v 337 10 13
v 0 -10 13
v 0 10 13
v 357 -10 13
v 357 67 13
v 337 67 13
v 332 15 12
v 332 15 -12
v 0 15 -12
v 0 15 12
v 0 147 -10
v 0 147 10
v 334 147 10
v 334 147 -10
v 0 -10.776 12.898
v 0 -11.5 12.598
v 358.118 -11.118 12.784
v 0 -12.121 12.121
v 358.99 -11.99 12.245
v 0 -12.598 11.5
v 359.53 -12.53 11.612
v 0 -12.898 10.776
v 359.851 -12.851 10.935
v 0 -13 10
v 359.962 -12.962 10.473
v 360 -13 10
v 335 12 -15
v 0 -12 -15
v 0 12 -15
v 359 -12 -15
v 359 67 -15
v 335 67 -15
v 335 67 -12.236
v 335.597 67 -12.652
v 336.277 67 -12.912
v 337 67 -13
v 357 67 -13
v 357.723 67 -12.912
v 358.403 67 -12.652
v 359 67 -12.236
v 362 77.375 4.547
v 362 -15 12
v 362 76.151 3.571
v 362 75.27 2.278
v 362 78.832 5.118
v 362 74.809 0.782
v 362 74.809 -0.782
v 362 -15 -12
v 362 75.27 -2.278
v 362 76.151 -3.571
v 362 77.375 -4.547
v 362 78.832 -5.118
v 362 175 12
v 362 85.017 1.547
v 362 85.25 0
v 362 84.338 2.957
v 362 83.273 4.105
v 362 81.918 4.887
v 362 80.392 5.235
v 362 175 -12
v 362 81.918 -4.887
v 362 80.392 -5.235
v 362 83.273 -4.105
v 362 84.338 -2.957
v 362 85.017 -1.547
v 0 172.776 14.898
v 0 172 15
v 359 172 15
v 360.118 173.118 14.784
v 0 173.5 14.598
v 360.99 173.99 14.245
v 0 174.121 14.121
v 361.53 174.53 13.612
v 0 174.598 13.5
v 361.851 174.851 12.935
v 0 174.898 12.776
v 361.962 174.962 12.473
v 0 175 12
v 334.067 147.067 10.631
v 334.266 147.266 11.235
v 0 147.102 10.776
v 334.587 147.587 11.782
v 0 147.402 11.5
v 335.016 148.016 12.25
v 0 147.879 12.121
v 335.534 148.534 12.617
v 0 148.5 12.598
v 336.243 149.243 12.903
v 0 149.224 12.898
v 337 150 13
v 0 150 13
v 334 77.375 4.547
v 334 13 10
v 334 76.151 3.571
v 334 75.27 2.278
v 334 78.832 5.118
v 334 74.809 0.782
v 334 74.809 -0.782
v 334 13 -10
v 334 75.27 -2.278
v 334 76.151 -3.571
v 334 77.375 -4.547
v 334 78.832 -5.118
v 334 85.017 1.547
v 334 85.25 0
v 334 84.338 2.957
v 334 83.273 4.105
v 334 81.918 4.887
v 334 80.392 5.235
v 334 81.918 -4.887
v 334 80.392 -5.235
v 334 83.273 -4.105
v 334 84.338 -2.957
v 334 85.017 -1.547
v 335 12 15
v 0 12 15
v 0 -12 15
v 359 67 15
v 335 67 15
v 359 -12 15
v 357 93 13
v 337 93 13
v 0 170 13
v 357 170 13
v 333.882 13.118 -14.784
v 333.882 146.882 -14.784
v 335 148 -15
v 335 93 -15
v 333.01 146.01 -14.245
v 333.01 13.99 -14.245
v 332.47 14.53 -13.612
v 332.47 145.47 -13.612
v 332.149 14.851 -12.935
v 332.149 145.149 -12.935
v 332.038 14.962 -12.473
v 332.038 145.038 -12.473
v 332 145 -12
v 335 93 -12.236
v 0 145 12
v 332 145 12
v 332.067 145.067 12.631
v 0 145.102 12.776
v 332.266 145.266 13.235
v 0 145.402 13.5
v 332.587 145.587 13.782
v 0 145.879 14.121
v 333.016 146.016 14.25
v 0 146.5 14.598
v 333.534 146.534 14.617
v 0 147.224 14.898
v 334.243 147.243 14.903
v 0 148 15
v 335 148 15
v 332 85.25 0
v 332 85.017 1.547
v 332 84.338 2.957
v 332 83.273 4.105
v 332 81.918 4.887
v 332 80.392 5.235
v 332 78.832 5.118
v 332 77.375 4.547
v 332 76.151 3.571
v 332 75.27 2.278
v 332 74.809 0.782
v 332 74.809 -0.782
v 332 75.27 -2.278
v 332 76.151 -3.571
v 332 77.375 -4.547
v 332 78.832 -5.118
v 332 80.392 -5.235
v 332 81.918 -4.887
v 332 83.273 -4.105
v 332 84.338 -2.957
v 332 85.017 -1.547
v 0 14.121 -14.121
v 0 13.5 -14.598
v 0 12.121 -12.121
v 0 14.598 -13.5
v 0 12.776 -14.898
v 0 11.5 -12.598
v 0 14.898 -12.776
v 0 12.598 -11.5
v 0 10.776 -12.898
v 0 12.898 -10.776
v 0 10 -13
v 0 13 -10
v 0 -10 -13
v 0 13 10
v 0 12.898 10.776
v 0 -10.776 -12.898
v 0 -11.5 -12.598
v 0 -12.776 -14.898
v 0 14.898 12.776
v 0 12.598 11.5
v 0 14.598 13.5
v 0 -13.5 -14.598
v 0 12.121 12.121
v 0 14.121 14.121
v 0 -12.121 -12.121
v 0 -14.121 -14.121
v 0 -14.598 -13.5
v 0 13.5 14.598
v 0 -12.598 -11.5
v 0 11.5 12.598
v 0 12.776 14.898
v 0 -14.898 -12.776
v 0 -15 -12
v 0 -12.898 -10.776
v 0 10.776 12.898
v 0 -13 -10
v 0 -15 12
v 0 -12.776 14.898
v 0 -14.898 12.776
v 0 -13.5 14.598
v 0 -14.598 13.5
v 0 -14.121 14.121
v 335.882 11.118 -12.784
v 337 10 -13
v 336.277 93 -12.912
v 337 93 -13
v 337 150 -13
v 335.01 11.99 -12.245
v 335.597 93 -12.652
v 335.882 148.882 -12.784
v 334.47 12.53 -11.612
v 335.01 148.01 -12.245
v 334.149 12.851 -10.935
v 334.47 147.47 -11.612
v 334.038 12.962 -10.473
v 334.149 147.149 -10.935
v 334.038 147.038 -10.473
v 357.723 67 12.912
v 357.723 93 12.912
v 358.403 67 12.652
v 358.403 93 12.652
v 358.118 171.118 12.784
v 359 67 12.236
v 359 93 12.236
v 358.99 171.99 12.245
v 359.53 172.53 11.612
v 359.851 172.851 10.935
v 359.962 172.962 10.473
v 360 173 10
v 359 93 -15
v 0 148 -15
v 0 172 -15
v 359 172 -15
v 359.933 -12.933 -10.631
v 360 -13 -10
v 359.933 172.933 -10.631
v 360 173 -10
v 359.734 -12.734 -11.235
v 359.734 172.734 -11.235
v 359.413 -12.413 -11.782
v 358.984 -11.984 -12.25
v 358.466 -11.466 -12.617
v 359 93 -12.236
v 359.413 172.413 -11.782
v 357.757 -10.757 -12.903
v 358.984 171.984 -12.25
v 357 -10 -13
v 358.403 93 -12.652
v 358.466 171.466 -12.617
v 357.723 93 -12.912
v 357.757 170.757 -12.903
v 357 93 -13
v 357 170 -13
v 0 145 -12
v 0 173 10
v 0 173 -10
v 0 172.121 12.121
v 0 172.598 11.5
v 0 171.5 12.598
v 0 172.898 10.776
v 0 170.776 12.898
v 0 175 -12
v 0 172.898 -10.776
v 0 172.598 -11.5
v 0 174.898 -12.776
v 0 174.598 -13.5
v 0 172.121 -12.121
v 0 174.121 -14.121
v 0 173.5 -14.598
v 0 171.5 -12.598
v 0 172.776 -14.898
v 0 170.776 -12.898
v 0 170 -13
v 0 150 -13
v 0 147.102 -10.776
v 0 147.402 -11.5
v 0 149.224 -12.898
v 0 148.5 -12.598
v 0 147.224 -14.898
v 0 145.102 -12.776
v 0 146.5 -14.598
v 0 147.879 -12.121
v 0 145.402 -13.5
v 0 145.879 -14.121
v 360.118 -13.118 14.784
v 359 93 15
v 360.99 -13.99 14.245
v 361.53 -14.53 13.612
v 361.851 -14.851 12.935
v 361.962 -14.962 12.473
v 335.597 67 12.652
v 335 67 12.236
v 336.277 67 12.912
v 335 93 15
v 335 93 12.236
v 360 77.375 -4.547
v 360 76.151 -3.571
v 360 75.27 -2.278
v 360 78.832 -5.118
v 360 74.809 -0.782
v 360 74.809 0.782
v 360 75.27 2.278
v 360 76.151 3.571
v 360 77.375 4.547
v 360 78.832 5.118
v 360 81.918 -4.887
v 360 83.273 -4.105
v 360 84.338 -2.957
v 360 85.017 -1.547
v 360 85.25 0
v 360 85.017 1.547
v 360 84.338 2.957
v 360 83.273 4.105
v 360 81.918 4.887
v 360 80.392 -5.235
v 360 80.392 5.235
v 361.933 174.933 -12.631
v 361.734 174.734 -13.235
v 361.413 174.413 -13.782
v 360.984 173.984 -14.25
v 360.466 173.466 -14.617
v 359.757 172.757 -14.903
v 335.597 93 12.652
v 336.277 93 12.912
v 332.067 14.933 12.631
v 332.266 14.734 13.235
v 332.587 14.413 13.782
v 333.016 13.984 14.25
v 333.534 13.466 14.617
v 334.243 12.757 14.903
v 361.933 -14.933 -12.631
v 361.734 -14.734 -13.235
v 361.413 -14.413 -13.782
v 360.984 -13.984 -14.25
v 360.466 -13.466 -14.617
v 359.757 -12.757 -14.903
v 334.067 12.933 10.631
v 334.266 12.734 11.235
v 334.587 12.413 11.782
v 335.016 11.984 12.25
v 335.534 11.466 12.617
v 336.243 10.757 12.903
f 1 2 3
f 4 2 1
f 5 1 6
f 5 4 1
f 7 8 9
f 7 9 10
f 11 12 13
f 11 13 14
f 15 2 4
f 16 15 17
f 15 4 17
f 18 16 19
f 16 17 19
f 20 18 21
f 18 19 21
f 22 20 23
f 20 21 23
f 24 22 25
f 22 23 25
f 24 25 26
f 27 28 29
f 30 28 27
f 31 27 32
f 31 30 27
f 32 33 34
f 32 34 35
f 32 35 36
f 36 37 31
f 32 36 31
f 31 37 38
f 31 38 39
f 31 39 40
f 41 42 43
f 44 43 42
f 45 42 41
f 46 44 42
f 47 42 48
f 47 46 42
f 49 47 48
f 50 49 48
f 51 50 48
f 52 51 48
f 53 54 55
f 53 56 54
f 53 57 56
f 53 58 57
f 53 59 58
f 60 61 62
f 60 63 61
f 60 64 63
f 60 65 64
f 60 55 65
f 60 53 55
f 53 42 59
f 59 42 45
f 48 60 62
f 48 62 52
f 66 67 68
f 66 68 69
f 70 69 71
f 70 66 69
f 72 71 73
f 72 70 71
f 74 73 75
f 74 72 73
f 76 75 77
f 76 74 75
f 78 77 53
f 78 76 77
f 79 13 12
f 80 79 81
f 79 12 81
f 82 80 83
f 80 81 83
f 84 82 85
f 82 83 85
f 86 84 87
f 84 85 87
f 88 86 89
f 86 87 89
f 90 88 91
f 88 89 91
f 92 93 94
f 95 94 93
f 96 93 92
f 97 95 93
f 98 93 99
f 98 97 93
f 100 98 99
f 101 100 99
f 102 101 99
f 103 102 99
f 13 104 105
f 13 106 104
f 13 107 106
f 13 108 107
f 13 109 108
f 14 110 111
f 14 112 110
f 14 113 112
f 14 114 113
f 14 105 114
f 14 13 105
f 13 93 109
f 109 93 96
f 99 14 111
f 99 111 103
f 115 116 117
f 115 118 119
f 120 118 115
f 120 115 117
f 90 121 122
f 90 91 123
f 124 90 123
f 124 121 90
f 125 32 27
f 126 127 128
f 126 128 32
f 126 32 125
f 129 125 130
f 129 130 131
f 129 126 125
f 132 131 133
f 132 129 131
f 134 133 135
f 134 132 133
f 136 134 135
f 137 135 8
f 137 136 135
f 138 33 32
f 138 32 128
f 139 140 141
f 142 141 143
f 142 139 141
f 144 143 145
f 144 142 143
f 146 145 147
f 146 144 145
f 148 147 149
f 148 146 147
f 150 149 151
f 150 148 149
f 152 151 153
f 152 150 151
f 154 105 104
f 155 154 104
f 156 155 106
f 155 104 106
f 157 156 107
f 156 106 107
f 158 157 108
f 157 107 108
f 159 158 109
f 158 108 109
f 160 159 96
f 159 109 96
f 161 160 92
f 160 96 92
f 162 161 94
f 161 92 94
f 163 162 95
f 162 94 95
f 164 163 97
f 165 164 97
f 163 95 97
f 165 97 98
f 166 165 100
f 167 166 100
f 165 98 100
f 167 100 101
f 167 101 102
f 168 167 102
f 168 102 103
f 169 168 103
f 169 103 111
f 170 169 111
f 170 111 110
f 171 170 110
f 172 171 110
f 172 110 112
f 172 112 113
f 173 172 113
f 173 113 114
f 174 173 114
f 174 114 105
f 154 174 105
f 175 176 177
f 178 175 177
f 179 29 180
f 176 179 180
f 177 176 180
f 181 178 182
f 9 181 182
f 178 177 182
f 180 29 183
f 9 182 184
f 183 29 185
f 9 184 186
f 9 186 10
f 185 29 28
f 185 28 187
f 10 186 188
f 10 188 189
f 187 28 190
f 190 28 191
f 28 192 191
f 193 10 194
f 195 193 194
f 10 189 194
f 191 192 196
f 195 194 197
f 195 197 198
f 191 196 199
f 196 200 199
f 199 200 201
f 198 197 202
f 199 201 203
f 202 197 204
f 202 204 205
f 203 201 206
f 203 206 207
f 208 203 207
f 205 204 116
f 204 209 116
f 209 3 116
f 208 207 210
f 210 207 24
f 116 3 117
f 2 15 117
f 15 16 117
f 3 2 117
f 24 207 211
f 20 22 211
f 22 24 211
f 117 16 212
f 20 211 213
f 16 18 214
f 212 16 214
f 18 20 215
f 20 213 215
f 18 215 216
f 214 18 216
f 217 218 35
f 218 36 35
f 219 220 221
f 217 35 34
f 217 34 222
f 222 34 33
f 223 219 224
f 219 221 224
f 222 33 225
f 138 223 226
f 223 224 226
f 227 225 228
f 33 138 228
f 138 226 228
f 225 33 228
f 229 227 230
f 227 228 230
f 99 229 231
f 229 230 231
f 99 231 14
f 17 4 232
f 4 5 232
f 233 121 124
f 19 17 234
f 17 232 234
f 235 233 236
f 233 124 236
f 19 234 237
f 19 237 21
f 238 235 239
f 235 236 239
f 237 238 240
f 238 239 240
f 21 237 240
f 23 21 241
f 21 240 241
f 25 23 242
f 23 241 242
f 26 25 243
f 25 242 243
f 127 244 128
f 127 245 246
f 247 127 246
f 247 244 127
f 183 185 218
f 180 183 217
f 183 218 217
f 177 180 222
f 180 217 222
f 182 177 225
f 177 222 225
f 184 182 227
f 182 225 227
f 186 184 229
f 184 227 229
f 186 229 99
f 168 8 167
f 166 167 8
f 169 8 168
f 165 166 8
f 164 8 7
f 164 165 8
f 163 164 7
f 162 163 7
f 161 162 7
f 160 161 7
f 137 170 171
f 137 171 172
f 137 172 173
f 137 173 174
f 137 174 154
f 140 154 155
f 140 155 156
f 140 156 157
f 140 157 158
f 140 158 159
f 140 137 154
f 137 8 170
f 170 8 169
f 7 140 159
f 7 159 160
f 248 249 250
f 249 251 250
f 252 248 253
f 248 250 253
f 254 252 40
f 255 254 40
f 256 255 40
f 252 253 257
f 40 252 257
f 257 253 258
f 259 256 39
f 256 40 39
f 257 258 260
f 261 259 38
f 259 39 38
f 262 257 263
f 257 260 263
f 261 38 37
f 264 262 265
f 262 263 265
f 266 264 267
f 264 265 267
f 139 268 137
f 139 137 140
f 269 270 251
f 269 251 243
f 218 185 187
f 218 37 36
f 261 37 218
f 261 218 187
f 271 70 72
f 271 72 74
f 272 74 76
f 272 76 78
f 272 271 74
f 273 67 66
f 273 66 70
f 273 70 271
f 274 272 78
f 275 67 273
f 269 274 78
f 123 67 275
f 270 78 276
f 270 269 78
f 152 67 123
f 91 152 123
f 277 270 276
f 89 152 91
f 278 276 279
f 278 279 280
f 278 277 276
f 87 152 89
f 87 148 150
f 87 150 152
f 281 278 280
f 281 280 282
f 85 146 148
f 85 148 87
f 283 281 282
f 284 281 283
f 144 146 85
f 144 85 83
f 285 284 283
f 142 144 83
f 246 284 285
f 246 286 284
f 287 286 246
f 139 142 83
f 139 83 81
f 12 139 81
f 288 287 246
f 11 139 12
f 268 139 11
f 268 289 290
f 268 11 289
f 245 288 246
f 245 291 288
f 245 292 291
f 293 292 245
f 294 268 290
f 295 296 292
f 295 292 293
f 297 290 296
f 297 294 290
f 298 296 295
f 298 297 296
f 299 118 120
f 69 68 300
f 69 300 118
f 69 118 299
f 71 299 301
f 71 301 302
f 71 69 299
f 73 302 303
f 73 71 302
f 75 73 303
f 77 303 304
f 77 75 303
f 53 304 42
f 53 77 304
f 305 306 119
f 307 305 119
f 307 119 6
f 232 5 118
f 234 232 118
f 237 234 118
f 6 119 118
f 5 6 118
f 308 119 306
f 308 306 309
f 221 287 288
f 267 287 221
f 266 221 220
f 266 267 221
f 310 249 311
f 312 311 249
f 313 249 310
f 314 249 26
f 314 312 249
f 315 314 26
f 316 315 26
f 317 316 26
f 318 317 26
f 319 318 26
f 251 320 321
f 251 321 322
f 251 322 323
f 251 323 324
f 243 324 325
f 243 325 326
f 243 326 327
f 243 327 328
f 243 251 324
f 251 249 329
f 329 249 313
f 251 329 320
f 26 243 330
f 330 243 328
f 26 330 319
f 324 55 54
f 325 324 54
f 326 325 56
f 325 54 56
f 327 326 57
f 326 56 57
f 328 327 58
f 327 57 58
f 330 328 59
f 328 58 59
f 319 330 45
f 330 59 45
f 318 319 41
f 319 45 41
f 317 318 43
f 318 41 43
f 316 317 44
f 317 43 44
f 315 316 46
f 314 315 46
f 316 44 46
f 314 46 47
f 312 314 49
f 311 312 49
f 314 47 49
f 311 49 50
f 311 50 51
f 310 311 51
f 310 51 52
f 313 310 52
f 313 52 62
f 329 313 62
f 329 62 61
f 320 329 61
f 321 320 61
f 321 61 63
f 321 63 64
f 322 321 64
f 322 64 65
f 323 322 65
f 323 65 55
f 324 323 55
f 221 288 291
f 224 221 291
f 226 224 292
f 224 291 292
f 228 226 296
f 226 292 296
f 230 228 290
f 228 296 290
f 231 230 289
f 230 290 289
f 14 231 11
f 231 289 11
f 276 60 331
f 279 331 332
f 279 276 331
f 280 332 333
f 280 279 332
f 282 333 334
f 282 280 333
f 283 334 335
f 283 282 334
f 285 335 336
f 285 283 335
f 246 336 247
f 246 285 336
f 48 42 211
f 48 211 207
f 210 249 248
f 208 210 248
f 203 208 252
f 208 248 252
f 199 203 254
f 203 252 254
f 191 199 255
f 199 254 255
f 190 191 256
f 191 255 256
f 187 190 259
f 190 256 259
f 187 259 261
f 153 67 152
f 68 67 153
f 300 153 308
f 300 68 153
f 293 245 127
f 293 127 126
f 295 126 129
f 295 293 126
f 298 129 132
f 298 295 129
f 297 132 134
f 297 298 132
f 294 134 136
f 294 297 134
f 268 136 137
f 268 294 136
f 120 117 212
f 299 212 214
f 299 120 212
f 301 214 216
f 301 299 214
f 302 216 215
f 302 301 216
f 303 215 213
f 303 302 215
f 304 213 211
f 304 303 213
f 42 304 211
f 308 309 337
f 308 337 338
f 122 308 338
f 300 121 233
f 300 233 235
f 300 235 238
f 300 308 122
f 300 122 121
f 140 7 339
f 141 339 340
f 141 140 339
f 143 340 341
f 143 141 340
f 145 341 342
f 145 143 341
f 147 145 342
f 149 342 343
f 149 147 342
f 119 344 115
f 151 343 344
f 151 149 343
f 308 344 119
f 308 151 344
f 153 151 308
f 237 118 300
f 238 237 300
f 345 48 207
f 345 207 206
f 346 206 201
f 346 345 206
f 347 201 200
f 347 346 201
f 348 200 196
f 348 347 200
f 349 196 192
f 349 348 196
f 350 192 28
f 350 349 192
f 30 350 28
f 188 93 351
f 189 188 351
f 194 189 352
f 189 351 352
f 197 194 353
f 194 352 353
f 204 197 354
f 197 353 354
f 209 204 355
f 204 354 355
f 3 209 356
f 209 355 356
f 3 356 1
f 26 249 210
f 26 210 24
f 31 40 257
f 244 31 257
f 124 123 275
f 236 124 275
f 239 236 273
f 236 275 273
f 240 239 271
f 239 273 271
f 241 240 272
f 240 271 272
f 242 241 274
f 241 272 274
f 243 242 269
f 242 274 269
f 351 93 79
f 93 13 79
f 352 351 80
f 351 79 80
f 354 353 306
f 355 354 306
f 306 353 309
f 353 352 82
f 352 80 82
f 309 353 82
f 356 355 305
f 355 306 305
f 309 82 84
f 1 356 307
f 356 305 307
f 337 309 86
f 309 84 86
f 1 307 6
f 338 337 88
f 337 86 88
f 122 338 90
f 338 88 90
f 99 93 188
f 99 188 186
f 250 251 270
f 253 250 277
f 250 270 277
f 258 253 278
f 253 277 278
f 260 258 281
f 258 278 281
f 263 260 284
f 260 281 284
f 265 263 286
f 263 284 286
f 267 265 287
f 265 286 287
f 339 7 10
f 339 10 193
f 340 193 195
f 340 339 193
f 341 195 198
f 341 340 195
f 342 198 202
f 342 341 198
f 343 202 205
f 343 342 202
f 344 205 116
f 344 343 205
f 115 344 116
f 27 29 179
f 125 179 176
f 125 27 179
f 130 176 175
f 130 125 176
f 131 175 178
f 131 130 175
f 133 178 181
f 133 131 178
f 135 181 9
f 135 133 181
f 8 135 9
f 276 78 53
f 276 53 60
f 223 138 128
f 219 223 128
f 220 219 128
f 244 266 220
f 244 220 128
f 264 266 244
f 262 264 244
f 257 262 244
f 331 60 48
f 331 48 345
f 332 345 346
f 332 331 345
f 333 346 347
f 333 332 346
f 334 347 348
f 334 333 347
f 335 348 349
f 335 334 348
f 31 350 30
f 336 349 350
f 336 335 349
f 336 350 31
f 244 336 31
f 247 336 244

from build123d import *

# Parameters (mm, degrees)
ESQUISSE3_R             = 5.25
ENL_V_MAT_EXTRU_1_DEPTH = 46
ESQUISSE4_W             = 24
ESQUISSE4_H             = 26
ENL_V_MAT_EXTRU_2_DEPTH = 46


with BuildPart() as part:
    # Balayage1: sweep along a path in Esquisse1
    with BuildLine(Plane.XY) as balayage1_path:
        Line((0, 0), (347, 0))
        Line((347, 0), (347, 160))
        Line((347, 160), (0, 160))
    # Esquisse2 → Balayage1 (sweep)
    with BuildSketch(Plane(origin=(0, 0, 0), x_dir=(0, 0, -1), z_dir=(1, 0, 0))):
        with BuildLine():
            Line((-12, -15), (12, -15))
            ThreePointArc((12, -15), (14.121320344, -14.121320344), (15, -12))
            Line((15, -12), (15, 12))
            ThreePointArc((15, 12), (14.121320344, 14.121320344), (12, 15))
            Line((12, 15), (-12, 15))
            ThreePointArc((-12, 15), (-14.121320344, 14.121320344), (-15, 12))
            Line((-15, 12), (-15, -12))
            ThreePointArc((-15, -12), (-14.121320344, -14.121320344), (-12, -15))
        make_face()
        with BuildLine():
            Line((-10, -13), (10, -13))
            ThreePointArc((10, -13), (12.121320344, -12.121320344), (13, -10))
            Line((13, -10), (13, 10))
            ThreePointArc((13, 10), (12.121320344, 12.121320344), (10, 13))
            Line((10, 13), (-10, 13))
            ThreePointArc((-10, 13), (-12.121320344, 12.121320344), (-13, 10))
            Line((-13, 10), (-13, -10))
            ThreePointArc((-13, -10), (-12.121320344, -12.121320344), (-10, -13))
        make_face(mode=Mode.SUBTRACT)
    sweep(path=balayage1_path.line, transition=Transition.RIGHT)

    # Esquisse3 → Enlèv. mat.-Extru.1 (cut)
    with BuildSketch(Plane(origin=(362, 0, 0), x_dir=(0, 0, -1), z_dir=(1, 0, 0))):
        with Locations(Location((0, 80, 0), (0, 0, 90))):
            Circle(ESQUISSE3_R)
    extrude(amount=-ENL_V_MAT_EXTRU_1_DEPTH, mode=Mode.SUBTRACT)

    # Esquisse4 → Enlèv. mat.-Extru.2 (cut)
    with BuildSketch(Plane.XY.offset(15)):
        with Locations((347, 80)):
            Rectangle(ESQUISSE4_W, ESQUISSE4_H)
    extrude(amount=-ENL_V_MAT_EXTRU_2_DEPTH, mode=Mode.SUBTRACT)


solid = part.part
